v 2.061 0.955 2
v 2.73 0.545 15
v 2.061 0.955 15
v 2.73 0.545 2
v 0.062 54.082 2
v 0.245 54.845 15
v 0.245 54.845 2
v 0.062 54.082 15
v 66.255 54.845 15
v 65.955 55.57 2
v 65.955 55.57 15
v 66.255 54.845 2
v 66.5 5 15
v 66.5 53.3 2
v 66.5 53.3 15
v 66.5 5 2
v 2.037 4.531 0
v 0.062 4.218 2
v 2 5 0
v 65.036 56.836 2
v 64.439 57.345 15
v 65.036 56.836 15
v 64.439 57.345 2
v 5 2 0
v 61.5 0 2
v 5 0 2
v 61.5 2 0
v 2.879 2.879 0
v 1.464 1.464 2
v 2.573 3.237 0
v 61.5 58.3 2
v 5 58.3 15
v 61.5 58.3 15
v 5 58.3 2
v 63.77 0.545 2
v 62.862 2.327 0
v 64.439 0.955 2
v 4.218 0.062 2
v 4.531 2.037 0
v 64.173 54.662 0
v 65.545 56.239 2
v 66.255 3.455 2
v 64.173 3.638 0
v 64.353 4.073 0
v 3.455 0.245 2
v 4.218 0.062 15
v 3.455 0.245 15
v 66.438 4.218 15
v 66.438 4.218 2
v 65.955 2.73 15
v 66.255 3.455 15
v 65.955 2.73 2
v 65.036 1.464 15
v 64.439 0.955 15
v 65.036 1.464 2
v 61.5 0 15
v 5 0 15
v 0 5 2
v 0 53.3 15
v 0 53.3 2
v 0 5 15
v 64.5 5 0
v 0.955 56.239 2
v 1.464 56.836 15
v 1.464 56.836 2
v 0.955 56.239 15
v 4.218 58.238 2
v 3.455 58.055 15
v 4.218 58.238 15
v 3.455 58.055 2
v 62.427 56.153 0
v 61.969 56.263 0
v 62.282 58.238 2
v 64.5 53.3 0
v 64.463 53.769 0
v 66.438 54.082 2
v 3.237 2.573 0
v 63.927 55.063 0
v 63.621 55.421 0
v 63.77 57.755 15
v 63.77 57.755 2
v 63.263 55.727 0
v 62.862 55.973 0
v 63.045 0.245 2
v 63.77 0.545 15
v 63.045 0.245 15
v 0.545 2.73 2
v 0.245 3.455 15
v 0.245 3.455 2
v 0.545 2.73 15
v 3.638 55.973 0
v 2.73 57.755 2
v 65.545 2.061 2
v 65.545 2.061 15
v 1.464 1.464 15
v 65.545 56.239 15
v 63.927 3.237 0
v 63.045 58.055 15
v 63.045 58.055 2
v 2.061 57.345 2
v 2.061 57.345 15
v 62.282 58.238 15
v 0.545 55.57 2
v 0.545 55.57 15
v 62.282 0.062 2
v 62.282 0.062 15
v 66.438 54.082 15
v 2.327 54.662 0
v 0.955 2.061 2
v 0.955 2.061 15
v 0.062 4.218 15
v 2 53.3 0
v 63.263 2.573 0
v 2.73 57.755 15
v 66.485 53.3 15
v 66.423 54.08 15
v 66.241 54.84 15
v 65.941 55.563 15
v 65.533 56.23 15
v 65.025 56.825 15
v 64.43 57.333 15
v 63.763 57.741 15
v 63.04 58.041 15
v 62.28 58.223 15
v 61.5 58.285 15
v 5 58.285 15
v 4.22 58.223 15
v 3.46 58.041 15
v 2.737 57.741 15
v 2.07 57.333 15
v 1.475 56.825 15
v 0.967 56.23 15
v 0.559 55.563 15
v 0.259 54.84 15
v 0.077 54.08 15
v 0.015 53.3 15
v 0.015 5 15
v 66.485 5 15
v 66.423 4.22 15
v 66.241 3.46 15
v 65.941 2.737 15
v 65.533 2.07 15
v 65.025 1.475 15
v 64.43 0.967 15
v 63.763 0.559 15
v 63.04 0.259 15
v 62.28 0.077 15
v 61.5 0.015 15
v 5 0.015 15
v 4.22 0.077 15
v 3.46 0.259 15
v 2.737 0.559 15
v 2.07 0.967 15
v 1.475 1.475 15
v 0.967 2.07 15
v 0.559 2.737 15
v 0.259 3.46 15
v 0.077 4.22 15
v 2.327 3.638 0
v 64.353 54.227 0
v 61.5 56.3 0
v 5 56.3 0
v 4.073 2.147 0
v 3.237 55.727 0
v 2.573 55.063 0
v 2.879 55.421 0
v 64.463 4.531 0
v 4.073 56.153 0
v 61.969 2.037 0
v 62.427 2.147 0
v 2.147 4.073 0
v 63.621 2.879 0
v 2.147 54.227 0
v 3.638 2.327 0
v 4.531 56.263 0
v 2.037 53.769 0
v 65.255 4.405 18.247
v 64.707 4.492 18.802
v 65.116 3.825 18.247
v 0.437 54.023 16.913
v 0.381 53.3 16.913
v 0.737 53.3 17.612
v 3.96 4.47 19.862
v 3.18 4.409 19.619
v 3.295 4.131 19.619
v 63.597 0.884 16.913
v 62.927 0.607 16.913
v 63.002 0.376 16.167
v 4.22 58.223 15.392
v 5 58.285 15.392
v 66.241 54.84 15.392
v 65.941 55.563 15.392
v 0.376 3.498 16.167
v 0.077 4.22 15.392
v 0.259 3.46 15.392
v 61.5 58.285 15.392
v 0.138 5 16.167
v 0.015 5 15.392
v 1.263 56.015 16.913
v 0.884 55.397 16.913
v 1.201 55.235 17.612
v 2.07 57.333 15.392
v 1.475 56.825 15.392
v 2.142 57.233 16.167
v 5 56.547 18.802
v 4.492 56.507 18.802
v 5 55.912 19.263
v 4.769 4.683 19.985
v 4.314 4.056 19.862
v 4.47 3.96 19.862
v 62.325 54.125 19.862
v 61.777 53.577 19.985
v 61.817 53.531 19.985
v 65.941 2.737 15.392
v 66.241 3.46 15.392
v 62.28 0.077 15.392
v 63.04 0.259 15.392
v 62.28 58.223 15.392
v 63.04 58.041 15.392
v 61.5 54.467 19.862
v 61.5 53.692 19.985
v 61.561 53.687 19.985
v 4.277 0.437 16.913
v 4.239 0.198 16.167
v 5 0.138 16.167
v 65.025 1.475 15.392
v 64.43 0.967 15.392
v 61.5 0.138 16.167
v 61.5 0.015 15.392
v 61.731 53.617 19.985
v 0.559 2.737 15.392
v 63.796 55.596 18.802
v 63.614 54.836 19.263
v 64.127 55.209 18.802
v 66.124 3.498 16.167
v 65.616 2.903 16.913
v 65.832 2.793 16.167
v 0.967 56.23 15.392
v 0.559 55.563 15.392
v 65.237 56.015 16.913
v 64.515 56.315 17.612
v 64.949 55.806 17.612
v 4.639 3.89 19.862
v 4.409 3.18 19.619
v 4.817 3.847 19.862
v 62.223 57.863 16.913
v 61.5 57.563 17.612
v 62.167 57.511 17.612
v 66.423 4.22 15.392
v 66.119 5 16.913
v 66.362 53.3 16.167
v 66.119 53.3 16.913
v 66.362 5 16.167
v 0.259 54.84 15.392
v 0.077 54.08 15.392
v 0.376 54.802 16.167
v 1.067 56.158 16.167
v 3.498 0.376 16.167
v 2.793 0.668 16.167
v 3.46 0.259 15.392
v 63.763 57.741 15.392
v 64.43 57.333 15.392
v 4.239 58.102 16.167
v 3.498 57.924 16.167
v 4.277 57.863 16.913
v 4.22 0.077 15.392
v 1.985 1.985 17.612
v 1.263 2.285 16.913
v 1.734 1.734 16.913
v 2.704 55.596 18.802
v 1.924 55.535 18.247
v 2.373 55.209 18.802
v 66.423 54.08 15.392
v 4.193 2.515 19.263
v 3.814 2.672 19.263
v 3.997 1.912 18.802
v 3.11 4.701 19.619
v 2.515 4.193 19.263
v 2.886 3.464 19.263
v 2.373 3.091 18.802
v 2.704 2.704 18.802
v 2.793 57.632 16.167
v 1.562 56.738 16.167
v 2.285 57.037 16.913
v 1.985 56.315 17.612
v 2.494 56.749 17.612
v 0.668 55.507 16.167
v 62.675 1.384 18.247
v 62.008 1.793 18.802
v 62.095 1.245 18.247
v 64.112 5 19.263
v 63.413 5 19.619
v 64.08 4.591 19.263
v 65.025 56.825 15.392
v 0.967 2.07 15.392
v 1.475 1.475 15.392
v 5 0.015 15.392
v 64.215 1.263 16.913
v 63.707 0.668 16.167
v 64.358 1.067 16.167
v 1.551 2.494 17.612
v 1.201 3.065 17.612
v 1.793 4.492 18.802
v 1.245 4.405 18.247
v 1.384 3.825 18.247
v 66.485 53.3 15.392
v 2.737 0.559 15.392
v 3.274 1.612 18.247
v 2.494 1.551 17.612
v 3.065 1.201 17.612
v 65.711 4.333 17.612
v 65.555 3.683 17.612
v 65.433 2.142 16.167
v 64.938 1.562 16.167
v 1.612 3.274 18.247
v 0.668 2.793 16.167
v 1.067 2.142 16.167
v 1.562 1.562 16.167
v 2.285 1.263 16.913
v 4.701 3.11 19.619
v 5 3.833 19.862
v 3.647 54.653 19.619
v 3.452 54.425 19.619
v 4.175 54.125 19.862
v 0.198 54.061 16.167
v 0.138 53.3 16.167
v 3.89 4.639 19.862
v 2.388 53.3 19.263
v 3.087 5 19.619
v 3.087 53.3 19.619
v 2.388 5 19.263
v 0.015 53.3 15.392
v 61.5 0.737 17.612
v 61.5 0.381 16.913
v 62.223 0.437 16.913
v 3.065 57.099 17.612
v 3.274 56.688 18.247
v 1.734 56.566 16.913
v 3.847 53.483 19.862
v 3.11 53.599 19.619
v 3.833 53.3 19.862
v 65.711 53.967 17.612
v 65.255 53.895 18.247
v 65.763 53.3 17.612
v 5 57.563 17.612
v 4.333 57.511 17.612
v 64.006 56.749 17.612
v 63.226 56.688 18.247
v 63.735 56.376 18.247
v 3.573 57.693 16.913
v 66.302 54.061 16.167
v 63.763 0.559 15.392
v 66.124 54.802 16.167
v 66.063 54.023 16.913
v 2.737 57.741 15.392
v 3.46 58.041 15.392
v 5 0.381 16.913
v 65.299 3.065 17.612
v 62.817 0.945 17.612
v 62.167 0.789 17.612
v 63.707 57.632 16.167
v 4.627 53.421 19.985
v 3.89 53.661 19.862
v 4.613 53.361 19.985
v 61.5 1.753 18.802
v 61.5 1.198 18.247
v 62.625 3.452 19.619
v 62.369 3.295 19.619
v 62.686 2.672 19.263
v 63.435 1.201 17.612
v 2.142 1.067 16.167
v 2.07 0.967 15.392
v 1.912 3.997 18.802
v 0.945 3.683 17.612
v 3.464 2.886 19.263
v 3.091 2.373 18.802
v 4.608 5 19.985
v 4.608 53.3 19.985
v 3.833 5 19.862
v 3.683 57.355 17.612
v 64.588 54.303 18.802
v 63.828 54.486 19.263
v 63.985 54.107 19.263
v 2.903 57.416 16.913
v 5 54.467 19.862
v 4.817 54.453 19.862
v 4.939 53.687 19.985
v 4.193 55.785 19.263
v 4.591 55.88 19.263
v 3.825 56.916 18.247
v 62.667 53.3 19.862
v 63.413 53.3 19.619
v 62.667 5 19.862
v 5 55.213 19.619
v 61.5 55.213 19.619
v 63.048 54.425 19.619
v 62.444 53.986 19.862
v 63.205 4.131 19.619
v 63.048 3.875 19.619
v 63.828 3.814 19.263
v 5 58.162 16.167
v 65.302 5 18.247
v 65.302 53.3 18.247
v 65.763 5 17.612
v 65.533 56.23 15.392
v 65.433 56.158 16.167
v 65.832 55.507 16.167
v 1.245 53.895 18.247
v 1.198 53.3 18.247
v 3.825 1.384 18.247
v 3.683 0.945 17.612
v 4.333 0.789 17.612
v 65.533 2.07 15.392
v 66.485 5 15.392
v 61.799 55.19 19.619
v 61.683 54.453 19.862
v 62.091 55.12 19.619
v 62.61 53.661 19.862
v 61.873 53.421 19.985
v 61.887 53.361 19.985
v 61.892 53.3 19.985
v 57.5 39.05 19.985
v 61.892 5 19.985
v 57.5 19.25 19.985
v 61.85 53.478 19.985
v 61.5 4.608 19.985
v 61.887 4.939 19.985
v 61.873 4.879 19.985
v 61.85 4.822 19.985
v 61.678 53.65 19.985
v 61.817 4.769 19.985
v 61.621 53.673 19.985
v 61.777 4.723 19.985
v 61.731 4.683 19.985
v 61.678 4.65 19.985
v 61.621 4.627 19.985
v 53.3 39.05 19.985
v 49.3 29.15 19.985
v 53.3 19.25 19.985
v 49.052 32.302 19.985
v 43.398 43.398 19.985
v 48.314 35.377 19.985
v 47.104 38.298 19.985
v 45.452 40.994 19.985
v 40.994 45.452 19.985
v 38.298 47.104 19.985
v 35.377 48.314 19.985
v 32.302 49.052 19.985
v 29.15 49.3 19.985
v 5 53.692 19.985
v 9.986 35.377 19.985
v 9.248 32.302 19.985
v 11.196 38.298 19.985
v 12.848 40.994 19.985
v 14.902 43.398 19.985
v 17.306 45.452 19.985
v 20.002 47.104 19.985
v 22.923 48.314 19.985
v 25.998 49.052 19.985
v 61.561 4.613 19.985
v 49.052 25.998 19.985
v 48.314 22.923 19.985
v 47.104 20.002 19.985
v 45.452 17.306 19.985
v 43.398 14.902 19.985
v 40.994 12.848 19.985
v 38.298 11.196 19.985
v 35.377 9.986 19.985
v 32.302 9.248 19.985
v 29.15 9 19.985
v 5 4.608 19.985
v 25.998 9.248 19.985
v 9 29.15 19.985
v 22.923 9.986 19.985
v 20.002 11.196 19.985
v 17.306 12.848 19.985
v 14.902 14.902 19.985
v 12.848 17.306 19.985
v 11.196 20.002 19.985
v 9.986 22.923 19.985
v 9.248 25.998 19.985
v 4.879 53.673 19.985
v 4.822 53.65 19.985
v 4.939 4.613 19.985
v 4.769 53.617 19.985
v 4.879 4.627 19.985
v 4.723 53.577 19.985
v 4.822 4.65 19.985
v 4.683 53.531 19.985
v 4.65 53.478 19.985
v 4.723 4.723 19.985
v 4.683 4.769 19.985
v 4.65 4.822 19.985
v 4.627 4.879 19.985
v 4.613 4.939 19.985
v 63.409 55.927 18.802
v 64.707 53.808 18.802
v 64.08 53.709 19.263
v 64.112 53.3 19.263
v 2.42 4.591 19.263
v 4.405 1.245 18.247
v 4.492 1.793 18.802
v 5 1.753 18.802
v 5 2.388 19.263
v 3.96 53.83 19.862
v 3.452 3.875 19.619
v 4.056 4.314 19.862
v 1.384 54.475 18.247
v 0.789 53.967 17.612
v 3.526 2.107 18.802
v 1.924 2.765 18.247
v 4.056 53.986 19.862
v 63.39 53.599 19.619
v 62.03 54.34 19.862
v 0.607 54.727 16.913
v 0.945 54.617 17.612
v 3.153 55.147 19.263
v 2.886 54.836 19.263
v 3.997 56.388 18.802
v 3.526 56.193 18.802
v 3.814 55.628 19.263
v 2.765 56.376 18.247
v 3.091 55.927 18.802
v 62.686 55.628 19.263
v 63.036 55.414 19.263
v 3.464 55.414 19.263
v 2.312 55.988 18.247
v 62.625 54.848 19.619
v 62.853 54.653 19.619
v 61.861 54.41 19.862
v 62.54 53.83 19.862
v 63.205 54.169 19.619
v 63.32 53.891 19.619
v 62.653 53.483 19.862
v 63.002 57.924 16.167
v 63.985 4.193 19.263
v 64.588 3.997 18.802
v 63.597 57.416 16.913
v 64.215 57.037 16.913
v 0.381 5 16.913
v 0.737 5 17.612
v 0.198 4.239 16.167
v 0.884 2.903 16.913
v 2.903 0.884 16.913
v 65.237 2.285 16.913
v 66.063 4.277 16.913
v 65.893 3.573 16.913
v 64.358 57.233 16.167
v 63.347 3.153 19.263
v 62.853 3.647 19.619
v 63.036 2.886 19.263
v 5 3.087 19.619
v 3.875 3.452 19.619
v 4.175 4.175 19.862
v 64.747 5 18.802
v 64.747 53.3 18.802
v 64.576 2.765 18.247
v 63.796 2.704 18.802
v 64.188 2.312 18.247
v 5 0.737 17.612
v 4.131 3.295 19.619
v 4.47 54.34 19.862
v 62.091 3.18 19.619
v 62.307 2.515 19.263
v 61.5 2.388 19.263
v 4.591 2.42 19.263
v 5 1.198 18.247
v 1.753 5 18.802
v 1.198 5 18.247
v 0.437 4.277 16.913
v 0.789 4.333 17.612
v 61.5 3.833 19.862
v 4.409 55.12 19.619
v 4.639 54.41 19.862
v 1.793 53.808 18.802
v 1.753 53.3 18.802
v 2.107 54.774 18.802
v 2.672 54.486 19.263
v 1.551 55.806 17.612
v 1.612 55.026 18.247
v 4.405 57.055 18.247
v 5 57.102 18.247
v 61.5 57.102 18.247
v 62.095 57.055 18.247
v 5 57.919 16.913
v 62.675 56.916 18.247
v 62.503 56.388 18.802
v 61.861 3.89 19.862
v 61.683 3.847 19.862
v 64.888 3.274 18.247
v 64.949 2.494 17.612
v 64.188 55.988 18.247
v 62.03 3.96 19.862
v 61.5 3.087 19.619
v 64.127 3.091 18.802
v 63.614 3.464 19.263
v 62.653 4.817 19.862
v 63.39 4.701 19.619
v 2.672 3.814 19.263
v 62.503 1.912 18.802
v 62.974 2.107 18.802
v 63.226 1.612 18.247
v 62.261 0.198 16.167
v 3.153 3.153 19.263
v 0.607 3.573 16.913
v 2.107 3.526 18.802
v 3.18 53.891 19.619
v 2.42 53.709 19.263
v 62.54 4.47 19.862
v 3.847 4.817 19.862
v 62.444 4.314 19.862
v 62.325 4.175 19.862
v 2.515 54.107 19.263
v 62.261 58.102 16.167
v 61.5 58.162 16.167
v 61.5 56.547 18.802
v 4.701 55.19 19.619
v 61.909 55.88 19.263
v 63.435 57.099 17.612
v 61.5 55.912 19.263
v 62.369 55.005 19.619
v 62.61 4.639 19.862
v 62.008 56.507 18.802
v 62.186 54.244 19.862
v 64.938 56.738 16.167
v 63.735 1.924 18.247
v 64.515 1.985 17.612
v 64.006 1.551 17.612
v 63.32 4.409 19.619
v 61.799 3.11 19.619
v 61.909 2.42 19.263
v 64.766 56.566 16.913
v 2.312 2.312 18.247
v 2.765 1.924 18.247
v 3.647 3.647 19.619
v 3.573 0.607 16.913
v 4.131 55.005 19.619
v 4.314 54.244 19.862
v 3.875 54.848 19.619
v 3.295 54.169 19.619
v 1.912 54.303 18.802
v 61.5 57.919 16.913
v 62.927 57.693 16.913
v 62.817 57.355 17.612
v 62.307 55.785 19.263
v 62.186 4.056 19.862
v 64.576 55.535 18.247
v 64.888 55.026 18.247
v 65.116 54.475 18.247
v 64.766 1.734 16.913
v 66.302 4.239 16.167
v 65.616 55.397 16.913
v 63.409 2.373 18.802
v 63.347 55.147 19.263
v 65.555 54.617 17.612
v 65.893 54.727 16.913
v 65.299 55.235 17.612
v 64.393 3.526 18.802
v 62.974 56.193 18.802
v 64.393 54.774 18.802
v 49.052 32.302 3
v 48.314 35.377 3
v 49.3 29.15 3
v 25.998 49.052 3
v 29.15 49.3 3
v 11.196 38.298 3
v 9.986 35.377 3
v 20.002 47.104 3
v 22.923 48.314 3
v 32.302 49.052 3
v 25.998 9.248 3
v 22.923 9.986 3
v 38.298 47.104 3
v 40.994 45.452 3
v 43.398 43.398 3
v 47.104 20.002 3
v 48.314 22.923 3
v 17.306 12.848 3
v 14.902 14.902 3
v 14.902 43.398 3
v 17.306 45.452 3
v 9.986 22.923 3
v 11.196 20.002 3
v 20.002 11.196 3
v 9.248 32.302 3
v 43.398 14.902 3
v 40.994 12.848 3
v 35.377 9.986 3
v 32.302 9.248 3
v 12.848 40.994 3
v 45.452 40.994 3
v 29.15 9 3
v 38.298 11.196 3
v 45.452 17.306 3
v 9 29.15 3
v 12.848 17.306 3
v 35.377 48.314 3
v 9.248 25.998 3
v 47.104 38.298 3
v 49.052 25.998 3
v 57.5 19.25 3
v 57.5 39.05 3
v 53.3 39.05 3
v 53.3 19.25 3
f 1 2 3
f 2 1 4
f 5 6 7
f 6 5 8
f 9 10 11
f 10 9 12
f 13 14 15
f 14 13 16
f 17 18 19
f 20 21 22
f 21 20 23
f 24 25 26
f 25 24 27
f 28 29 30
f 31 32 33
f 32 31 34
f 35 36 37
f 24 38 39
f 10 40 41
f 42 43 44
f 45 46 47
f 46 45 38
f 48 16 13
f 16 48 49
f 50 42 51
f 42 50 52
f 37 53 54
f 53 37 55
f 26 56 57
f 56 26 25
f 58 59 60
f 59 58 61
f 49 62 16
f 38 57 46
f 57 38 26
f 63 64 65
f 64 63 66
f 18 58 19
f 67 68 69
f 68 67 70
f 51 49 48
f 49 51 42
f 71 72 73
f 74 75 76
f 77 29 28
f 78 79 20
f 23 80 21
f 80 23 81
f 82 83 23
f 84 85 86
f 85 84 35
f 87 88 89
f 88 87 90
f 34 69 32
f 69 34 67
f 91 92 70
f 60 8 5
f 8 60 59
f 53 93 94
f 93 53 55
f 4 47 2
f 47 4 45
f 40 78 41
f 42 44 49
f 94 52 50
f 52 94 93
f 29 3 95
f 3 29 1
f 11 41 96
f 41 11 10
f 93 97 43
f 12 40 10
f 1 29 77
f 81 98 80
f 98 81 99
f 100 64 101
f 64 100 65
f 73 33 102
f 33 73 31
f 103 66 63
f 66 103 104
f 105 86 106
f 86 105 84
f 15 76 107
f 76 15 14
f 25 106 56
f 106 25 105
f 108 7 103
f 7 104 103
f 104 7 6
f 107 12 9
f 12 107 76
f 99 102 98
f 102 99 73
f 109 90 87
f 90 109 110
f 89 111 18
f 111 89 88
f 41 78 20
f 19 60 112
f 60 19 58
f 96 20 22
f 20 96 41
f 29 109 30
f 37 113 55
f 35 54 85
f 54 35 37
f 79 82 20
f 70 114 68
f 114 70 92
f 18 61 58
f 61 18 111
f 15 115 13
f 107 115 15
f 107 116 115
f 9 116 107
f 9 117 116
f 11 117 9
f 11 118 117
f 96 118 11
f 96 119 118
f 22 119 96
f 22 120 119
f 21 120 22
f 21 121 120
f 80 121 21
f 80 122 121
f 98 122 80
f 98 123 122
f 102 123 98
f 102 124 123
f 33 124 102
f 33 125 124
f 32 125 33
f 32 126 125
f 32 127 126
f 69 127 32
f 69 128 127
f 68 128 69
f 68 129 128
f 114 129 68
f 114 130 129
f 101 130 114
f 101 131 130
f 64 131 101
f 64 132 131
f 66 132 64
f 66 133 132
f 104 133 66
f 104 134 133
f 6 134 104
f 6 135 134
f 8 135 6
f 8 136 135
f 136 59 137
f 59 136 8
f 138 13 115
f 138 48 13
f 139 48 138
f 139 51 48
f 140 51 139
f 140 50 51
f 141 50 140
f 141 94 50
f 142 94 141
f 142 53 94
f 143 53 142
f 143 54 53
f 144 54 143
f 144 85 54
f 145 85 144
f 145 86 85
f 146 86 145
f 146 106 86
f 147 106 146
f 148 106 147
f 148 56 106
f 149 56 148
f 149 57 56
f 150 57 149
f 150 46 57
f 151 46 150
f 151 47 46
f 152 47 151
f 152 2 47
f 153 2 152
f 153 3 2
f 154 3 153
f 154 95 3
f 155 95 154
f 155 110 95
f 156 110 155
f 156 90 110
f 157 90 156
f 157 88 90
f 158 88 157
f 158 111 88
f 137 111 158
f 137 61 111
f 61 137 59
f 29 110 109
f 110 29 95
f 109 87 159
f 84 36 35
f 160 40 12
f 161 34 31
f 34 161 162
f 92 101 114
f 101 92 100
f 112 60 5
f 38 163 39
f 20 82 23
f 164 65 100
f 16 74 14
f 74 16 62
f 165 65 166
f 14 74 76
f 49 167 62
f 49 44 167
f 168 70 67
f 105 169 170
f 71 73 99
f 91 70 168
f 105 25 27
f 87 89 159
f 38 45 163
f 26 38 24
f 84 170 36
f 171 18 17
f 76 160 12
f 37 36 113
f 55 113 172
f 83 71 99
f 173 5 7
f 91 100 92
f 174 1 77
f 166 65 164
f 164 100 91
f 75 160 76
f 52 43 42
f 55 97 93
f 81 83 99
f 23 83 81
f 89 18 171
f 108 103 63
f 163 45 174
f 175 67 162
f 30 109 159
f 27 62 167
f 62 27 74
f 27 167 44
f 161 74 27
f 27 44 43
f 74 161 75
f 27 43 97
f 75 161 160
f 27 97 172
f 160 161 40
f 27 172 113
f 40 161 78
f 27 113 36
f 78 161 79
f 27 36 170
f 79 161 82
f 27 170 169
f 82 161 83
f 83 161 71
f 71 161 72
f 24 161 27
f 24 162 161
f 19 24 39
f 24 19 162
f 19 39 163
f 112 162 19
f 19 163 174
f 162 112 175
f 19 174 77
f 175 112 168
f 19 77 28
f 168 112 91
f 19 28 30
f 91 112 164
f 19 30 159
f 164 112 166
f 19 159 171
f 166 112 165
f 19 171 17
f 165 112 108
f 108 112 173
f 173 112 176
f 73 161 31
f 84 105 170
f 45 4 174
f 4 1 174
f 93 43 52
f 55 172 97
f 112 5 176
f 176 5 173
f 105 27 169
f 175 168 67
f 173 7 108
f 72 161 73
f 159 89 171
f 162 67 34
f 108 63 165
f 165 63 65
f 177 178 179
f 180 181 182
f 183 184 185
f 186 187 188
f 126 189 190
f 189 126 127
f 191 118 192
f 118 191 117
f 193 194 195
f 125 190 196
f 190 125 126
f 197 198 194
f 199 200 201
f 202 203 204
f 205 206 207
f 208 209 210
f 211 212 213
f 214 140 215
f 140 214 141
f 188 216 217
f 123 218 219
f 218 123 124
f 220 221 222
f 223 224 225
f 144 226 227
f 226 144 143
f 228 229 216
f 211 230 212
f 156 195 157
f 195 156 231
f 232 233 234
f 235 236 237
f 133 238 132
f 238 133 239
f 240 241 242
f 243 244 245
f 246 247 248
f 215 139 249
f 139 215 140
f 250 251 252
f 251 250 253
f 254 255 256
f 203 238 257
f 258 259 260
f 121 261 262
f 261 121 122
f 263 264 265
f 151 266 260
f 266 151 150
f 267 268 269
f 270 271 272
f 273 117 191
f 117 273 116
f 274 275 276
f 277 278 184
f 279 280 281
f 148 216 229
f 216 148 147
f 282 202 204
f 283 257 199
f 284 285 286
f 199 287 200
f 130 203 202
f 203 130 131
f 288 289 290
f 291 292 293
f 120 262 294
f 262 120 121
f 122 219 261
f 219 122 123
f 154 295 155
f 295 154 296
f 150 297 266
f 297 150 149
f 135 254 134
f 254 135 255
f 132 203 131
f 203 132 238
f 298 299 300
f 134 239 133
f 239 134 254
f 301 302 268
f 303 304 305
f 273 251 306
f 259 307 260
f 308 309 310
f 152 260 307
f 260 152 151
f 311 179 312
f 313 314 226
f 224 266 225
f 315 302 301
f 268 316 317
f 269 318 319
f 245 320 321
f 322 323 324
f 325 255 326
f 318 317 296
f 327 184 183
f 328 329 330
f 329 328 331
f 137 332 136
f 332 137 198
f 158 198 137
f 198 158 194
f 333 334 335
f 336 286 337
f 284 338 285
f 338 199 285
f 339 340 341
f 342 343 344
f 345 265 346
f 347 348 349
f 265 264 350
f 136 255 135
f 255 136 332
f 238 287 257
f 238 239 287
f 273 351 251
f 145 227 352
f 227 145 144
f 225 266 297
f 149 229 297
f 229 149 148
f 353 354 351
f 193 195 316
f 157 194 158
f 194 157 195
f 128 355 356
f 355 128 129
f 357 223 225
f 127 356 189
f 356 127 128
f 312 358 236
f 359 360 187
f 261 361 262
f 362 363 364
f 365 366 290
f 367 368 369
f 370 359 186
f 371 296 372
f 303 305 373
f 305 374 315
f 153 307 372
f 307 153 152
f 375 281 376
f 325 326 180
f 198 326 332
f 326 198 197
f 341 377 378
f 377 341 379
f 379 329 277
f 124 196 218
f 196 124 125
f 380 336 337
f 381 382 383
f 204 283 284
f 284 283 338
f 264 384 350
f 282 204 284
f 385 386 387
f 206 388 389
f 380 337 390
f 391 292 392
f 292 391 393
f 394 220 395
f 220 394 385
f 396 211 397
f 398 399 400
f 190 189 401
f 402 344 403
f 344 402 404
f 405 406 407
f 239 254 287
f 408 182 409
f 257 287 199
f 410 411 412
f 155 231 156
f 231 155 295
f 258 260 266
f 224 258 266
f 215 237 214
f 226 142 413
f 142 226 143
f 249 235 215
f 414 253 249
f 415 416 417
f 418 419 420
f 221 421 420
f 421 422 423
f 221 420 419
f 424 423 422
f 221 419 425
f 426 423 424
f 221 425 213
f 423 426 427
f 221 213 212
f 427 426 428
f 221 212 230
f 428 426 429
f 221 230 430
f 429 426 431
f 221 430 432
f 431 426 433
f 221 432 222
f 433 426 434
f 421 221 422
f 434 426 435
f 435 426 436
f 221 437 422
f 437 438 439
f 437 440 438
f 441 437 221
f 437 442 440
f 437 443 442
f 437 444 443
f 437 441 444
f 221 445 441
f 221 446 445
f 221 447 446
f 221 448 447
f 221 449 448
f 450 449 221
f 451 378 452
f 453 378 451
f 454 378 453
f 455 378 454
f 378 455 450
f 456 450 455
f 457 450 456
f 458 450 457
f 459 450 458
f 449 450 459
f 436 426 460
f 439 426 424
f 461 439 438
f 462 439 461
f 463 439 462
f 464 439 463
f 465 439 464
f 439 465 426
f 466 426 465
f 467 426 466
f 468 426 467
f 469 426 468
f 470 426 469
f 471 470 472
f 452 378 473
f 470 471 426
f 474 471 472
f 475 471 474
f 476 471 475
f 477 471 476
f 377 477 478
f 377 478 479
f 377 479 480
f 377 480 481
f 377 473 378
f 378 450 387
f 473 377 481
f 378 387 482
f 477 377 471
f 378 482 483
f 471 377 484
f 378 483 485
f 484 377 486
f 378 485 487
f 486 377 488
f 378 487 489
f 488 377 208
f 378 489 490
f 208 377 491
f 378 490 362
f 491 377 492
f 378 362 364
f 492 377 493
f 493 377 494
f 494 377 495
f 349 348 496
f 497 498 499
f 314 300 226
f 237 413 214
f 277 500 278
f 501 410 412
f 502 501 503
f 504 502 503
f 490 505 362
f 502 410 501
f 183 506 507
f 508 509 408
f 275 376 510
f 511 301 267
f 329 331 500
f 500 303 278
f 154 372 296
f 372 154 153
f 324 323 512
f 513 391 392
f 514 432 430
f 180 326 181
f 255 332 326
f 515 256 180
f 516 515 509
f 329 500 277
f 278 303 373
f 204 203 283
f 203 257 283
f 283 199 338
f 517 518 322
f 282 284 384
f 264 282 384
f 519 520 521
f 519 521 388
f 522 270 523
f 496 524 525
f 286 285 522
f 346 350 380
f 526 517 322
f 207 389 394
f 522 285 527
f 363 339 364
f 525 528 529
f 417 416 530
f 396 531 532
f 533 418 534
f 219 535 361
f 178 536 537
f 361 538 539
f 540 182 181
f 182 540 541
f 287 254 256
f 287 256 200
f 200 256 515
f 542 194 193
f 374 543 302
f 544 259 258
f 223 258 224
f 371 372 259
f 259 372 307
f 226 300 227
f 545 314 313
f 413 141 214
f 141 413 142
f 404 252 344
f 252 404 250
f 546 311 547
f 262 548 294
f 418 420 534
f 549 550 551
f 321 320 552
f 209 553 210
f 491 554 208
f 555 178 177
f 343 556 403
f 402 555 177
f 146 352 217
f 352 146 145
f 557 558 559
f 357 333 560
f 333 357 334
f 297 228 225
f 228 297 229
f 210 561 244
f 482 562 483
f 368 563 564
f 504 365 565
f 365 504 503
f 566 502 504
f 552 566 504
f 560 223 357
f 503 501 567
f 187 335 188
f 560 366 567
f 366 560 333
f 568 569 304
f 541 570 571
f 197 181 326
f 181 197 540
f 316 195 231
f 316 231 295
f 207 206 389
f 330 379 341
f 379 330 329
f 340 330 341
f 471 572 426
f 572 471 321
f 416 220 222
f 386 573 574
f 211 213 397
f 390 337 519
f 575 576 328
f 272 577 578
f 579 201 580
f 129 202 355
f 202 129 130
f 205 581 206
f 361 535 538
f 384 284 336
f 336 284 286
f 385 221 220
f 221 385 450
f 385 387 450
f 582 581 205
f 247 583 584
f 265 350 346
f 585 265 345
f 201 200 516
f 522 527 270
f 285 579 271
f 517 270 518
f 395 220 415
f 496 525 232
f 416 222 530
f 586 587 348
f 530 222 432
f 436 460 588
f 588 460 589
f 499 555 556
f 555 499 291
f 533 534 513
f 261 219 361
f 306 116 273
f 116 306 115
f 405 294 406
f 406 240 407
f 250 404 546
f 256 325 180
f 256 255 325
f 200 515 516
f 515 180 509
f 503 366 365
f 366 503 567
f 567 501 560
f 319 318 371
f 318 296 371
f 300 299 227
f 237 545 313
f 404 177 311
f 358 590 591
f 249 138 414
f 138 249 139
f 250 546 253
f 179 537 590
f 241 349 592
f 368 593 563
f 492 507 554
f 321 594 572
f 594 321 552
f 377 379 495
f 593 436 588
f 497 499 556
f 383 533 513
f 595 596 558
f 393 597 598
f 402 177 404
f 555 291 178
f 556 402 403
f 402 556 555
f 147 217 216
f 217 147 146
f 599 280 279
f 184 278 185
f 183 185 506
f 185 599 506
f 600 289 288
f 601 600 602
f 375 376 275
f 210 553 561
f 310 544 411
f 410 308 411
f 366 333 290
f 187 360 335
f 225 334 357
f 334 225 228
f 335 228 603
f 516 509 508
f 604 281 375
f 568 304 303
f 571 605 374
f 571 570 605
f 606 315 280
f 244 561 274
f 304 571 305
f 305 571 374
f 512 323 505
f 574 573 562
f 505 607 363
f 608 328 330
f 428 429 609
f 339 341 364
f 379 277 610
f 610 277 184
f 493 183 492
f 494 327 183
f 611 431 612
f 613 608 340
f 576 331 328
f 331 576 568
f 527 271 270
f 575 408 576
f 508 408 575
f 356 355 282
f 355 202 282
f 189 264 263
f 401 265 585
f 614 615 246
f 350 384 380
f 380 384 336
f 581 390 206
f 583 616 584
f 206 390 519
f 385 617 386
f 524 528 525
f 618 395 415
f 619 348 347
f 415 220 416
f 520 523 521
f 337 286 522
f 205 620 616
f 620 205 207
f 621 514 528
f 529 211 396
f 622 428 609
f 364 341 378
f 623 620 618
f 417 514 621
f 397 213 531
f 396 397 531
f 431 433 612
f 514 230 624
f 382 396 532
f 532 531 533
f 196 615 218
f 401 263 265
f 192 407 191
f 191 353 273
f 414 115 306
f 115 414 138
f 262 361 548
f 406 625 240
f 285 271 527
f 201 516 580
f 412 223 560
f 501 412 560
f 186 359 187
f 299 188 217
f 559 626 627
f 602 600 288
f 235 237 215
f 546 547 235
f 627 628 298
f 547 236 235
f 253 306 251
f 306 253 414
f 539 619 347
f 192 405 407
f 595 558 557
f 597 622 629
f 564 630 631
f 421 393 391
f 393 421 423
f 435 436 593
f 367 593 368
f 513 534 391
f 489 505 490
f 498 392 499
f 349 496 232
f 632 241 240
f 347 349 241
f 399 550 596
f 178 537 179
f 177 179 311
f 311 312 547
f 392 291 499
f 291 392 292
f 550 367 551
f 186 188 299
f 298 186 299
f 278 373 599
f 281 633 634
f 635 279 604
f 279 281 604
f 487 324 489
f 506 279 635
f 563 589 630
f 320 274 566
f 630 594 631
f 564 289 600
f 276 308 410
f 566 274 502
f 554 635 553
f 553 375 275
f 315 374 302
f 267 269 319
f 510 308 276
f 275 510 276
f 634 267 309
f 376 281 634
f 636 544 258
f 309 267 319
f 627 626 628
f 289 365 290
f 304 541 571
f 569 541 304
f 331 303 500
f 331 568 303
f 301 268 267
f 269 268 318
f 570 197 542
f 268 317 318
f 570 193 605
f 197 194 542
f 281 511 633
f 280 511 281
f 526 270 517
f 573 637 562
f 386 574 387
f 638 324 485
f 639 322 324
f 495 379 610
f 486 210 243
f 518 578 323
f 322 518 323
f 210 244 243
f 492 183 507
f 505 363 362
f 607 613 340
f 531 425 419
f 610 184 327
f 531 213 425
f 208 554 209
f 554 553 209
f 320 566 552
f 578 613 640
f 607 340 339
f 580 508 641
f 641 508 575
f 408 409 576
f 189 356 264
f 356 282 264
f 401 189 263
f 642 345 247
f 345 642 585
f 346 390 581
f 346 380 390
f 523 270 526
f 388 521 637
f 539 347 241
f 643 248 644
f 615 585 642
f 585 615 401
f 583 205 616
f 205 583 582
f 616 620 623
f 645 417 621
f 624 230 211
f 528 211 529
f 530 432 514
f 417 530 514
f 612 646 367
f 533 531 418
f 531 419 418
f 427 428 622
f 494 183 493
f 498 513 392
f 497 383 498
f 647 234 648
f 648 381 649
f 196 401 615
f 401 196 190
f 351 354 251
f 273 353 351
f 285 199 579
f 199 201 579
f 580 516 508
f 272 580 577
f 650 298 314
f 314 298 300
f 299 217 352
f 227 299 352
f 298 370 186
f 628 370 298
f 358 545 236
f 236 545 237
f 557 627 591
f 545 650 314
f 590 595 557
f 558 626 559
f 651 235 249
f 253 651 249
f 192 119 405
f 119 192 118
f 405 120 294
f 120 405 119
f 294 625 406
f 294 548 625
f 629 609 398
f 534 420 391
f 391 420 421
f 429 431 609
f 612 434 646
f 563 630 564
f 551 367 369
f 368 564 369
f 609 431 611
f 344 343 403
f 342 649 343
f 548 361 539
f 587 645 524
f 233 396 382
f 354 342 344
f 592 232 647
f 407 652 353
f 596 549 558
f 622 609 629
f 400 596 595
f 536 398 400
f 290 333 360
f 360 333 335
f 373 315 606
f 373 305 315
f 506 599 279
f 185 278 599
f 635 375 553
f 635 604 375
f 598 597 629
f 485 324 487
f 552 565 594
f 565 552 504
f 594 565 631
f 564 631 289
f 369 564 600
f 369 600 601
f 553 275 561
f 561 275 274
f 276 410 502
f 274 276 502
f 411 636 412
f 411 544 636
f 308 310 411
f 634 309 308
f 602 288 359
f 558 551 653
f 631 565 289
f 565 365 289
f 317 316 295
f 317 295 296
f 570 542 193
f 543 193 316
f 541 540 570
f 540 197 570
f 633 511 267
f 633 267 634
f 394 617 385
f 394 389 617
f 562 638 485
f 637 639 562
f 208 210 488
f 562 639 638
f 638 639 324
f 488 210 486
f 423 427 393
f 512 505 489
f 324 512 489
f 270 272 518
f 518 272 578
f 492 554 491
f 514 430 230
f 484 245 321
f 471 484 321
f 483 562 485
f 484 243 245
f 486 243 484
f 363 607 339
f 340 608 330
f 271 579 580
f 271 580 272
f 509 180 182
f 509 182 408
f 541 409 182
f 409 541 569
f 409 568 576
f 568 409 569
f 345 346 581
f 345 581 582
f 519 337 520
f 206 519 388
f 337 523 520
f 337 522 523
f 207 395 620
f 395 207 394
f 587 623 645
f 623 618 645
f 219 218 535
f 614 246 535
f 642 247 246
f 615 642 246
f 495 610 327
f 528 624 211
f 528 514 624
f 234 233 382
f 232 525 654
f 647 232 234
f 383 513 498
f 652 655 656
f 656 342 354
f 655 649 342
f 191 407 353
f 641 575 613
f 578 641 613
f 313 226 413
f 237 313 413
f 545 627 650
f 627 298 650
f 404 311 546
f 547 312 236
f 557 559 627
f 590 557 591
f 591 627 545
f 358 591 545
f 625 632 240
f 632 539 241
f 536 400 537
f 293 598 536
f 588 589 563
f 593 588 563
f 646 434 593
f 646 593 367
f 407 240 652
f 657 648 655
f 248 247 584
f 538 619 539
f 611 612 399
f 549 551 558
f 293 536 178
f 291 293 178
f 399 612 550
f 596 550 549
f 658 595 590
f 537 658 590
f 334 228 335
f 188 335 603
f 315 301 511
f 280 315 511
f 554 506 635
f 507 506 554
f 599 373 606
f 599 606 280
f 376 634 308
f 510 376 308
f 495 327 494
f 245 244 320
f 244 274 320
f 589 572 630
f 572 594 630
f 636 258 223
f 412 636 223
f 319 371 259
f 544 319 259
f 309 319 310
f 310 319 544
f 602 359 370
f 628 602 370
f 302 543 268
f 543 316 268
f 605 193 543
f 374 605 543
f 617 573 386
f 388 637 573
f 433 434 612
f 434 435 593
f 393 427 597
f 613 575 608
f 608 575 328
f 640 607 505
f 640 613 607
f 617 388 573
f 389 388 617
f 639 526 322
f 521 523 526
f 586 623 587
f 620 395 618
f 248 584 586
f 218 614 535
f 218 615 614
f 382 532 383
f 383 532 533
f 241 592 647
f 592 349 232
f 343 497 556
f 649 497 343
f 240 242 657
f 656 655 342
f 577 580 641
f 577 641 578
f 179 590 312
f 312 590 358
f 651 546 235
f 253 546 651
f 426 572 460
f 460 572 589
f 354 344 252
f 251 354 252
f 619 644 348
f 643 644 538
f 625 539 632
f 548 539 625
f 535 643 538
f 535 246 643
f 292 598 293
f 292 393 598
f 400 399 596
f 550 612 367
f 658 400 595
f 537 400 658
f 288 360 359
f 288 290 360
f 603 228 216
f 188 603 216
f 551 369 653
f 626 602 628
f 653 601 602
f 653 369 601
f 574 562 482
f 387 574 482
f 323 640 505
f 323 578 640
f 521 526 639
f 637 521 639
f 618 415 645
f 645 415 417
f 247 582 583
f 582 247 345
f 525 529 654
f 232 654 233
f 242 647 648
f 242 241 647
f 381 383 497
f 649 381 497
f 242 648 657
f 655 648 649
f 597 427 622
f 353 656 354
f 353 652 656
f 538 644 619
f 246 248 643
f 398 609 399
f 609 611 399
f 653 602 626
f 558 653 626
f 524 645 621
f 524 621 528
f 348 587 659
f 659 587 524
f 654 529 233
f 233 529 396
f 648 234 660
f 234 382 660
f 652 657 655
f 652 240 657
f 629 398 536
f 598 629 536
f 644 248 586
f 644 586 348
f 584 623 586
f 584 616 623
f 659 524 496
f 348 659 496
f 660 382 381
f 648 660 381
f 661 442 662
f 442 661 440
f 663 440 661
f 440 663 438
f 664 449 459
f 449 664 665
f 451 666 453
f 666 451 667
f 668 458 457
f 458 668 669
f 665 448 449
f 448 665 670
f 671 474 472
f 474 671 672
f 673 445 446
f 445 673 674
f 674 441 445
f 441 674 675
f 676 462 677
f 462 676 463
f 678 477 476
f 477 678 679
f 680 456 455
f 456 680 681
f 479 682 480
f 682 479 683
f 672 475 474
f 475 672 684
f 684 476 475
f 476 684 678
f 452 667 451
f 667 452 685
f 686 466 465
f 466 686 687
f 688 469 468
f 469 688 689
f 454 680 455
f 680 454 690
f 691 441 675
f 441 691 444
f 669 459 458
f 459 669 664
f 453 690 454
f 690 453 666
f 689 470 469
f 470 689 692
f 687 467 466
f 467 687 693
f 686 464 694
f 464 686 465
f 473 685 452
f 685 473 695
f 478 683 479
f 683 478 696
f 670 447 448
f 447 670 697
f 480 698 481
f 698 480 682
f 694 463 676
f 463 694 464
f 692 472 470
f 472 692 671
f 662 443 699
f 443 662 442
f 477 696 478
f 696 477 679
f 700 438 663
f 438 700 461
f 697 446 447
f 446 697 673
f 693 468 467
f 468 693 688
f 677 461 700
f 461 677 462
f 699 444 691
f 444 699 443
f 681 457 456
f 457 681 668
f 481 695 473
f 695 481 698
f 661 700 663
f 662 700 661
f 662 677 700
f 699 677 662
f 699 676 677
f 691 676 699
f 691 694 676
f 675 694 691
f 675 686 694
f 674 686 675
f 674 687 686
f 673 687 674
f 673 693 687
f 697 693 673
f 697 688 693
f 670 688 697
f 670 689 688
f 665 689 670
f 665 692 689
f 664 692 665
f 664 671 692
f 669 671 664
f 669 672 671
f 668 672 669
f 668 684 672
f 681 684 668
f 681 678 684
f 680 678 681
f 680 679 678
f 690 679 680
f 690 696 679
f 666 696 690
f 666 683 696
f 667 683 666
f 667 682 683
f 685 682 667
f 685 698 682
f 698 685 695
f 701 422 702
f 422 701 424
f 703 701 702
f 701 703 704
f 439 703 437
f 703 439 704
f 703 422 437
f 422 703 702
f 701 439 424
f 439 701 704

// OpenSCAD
add = 0.1;
slot = [4.1 + add, 19.7 + add, 17];
hole = 40.3;
base = 3;
gap = 4;
bevel = 5;

size = [bevel * 2 + gap * 3 + hole + slot.x, bevel * 2 + gap * 2 + hole, slot.z + base];

$fs = 0.1;
$fn = 40;

module box(size)
{
	b = bevel;
	c = 2;

	module shape()
	{
		cylinder(r1 = b - c, r2 = b, h = c);
		translate([0, 0, c]) 
		intersection()
		{
			sphere(r = b);
			translate([-b, -b]) cube(b * 2);
		}
	}

	translate([b, b, b]) 
	minkowski()
	{
		translate([0, 0, -b]) cube(size - [b * 2, b * 2, b + c]);
		shape();
	}
}

difference()
{
	box(size);
	translate([bevel + gap + hole / 2, size.y / 2, base]) cylinder(d = hole, h = slot.z);
	translate([bevel + gap + hole + gap, (size.y - slot.y) / 2, base]) cube(slot);
}
